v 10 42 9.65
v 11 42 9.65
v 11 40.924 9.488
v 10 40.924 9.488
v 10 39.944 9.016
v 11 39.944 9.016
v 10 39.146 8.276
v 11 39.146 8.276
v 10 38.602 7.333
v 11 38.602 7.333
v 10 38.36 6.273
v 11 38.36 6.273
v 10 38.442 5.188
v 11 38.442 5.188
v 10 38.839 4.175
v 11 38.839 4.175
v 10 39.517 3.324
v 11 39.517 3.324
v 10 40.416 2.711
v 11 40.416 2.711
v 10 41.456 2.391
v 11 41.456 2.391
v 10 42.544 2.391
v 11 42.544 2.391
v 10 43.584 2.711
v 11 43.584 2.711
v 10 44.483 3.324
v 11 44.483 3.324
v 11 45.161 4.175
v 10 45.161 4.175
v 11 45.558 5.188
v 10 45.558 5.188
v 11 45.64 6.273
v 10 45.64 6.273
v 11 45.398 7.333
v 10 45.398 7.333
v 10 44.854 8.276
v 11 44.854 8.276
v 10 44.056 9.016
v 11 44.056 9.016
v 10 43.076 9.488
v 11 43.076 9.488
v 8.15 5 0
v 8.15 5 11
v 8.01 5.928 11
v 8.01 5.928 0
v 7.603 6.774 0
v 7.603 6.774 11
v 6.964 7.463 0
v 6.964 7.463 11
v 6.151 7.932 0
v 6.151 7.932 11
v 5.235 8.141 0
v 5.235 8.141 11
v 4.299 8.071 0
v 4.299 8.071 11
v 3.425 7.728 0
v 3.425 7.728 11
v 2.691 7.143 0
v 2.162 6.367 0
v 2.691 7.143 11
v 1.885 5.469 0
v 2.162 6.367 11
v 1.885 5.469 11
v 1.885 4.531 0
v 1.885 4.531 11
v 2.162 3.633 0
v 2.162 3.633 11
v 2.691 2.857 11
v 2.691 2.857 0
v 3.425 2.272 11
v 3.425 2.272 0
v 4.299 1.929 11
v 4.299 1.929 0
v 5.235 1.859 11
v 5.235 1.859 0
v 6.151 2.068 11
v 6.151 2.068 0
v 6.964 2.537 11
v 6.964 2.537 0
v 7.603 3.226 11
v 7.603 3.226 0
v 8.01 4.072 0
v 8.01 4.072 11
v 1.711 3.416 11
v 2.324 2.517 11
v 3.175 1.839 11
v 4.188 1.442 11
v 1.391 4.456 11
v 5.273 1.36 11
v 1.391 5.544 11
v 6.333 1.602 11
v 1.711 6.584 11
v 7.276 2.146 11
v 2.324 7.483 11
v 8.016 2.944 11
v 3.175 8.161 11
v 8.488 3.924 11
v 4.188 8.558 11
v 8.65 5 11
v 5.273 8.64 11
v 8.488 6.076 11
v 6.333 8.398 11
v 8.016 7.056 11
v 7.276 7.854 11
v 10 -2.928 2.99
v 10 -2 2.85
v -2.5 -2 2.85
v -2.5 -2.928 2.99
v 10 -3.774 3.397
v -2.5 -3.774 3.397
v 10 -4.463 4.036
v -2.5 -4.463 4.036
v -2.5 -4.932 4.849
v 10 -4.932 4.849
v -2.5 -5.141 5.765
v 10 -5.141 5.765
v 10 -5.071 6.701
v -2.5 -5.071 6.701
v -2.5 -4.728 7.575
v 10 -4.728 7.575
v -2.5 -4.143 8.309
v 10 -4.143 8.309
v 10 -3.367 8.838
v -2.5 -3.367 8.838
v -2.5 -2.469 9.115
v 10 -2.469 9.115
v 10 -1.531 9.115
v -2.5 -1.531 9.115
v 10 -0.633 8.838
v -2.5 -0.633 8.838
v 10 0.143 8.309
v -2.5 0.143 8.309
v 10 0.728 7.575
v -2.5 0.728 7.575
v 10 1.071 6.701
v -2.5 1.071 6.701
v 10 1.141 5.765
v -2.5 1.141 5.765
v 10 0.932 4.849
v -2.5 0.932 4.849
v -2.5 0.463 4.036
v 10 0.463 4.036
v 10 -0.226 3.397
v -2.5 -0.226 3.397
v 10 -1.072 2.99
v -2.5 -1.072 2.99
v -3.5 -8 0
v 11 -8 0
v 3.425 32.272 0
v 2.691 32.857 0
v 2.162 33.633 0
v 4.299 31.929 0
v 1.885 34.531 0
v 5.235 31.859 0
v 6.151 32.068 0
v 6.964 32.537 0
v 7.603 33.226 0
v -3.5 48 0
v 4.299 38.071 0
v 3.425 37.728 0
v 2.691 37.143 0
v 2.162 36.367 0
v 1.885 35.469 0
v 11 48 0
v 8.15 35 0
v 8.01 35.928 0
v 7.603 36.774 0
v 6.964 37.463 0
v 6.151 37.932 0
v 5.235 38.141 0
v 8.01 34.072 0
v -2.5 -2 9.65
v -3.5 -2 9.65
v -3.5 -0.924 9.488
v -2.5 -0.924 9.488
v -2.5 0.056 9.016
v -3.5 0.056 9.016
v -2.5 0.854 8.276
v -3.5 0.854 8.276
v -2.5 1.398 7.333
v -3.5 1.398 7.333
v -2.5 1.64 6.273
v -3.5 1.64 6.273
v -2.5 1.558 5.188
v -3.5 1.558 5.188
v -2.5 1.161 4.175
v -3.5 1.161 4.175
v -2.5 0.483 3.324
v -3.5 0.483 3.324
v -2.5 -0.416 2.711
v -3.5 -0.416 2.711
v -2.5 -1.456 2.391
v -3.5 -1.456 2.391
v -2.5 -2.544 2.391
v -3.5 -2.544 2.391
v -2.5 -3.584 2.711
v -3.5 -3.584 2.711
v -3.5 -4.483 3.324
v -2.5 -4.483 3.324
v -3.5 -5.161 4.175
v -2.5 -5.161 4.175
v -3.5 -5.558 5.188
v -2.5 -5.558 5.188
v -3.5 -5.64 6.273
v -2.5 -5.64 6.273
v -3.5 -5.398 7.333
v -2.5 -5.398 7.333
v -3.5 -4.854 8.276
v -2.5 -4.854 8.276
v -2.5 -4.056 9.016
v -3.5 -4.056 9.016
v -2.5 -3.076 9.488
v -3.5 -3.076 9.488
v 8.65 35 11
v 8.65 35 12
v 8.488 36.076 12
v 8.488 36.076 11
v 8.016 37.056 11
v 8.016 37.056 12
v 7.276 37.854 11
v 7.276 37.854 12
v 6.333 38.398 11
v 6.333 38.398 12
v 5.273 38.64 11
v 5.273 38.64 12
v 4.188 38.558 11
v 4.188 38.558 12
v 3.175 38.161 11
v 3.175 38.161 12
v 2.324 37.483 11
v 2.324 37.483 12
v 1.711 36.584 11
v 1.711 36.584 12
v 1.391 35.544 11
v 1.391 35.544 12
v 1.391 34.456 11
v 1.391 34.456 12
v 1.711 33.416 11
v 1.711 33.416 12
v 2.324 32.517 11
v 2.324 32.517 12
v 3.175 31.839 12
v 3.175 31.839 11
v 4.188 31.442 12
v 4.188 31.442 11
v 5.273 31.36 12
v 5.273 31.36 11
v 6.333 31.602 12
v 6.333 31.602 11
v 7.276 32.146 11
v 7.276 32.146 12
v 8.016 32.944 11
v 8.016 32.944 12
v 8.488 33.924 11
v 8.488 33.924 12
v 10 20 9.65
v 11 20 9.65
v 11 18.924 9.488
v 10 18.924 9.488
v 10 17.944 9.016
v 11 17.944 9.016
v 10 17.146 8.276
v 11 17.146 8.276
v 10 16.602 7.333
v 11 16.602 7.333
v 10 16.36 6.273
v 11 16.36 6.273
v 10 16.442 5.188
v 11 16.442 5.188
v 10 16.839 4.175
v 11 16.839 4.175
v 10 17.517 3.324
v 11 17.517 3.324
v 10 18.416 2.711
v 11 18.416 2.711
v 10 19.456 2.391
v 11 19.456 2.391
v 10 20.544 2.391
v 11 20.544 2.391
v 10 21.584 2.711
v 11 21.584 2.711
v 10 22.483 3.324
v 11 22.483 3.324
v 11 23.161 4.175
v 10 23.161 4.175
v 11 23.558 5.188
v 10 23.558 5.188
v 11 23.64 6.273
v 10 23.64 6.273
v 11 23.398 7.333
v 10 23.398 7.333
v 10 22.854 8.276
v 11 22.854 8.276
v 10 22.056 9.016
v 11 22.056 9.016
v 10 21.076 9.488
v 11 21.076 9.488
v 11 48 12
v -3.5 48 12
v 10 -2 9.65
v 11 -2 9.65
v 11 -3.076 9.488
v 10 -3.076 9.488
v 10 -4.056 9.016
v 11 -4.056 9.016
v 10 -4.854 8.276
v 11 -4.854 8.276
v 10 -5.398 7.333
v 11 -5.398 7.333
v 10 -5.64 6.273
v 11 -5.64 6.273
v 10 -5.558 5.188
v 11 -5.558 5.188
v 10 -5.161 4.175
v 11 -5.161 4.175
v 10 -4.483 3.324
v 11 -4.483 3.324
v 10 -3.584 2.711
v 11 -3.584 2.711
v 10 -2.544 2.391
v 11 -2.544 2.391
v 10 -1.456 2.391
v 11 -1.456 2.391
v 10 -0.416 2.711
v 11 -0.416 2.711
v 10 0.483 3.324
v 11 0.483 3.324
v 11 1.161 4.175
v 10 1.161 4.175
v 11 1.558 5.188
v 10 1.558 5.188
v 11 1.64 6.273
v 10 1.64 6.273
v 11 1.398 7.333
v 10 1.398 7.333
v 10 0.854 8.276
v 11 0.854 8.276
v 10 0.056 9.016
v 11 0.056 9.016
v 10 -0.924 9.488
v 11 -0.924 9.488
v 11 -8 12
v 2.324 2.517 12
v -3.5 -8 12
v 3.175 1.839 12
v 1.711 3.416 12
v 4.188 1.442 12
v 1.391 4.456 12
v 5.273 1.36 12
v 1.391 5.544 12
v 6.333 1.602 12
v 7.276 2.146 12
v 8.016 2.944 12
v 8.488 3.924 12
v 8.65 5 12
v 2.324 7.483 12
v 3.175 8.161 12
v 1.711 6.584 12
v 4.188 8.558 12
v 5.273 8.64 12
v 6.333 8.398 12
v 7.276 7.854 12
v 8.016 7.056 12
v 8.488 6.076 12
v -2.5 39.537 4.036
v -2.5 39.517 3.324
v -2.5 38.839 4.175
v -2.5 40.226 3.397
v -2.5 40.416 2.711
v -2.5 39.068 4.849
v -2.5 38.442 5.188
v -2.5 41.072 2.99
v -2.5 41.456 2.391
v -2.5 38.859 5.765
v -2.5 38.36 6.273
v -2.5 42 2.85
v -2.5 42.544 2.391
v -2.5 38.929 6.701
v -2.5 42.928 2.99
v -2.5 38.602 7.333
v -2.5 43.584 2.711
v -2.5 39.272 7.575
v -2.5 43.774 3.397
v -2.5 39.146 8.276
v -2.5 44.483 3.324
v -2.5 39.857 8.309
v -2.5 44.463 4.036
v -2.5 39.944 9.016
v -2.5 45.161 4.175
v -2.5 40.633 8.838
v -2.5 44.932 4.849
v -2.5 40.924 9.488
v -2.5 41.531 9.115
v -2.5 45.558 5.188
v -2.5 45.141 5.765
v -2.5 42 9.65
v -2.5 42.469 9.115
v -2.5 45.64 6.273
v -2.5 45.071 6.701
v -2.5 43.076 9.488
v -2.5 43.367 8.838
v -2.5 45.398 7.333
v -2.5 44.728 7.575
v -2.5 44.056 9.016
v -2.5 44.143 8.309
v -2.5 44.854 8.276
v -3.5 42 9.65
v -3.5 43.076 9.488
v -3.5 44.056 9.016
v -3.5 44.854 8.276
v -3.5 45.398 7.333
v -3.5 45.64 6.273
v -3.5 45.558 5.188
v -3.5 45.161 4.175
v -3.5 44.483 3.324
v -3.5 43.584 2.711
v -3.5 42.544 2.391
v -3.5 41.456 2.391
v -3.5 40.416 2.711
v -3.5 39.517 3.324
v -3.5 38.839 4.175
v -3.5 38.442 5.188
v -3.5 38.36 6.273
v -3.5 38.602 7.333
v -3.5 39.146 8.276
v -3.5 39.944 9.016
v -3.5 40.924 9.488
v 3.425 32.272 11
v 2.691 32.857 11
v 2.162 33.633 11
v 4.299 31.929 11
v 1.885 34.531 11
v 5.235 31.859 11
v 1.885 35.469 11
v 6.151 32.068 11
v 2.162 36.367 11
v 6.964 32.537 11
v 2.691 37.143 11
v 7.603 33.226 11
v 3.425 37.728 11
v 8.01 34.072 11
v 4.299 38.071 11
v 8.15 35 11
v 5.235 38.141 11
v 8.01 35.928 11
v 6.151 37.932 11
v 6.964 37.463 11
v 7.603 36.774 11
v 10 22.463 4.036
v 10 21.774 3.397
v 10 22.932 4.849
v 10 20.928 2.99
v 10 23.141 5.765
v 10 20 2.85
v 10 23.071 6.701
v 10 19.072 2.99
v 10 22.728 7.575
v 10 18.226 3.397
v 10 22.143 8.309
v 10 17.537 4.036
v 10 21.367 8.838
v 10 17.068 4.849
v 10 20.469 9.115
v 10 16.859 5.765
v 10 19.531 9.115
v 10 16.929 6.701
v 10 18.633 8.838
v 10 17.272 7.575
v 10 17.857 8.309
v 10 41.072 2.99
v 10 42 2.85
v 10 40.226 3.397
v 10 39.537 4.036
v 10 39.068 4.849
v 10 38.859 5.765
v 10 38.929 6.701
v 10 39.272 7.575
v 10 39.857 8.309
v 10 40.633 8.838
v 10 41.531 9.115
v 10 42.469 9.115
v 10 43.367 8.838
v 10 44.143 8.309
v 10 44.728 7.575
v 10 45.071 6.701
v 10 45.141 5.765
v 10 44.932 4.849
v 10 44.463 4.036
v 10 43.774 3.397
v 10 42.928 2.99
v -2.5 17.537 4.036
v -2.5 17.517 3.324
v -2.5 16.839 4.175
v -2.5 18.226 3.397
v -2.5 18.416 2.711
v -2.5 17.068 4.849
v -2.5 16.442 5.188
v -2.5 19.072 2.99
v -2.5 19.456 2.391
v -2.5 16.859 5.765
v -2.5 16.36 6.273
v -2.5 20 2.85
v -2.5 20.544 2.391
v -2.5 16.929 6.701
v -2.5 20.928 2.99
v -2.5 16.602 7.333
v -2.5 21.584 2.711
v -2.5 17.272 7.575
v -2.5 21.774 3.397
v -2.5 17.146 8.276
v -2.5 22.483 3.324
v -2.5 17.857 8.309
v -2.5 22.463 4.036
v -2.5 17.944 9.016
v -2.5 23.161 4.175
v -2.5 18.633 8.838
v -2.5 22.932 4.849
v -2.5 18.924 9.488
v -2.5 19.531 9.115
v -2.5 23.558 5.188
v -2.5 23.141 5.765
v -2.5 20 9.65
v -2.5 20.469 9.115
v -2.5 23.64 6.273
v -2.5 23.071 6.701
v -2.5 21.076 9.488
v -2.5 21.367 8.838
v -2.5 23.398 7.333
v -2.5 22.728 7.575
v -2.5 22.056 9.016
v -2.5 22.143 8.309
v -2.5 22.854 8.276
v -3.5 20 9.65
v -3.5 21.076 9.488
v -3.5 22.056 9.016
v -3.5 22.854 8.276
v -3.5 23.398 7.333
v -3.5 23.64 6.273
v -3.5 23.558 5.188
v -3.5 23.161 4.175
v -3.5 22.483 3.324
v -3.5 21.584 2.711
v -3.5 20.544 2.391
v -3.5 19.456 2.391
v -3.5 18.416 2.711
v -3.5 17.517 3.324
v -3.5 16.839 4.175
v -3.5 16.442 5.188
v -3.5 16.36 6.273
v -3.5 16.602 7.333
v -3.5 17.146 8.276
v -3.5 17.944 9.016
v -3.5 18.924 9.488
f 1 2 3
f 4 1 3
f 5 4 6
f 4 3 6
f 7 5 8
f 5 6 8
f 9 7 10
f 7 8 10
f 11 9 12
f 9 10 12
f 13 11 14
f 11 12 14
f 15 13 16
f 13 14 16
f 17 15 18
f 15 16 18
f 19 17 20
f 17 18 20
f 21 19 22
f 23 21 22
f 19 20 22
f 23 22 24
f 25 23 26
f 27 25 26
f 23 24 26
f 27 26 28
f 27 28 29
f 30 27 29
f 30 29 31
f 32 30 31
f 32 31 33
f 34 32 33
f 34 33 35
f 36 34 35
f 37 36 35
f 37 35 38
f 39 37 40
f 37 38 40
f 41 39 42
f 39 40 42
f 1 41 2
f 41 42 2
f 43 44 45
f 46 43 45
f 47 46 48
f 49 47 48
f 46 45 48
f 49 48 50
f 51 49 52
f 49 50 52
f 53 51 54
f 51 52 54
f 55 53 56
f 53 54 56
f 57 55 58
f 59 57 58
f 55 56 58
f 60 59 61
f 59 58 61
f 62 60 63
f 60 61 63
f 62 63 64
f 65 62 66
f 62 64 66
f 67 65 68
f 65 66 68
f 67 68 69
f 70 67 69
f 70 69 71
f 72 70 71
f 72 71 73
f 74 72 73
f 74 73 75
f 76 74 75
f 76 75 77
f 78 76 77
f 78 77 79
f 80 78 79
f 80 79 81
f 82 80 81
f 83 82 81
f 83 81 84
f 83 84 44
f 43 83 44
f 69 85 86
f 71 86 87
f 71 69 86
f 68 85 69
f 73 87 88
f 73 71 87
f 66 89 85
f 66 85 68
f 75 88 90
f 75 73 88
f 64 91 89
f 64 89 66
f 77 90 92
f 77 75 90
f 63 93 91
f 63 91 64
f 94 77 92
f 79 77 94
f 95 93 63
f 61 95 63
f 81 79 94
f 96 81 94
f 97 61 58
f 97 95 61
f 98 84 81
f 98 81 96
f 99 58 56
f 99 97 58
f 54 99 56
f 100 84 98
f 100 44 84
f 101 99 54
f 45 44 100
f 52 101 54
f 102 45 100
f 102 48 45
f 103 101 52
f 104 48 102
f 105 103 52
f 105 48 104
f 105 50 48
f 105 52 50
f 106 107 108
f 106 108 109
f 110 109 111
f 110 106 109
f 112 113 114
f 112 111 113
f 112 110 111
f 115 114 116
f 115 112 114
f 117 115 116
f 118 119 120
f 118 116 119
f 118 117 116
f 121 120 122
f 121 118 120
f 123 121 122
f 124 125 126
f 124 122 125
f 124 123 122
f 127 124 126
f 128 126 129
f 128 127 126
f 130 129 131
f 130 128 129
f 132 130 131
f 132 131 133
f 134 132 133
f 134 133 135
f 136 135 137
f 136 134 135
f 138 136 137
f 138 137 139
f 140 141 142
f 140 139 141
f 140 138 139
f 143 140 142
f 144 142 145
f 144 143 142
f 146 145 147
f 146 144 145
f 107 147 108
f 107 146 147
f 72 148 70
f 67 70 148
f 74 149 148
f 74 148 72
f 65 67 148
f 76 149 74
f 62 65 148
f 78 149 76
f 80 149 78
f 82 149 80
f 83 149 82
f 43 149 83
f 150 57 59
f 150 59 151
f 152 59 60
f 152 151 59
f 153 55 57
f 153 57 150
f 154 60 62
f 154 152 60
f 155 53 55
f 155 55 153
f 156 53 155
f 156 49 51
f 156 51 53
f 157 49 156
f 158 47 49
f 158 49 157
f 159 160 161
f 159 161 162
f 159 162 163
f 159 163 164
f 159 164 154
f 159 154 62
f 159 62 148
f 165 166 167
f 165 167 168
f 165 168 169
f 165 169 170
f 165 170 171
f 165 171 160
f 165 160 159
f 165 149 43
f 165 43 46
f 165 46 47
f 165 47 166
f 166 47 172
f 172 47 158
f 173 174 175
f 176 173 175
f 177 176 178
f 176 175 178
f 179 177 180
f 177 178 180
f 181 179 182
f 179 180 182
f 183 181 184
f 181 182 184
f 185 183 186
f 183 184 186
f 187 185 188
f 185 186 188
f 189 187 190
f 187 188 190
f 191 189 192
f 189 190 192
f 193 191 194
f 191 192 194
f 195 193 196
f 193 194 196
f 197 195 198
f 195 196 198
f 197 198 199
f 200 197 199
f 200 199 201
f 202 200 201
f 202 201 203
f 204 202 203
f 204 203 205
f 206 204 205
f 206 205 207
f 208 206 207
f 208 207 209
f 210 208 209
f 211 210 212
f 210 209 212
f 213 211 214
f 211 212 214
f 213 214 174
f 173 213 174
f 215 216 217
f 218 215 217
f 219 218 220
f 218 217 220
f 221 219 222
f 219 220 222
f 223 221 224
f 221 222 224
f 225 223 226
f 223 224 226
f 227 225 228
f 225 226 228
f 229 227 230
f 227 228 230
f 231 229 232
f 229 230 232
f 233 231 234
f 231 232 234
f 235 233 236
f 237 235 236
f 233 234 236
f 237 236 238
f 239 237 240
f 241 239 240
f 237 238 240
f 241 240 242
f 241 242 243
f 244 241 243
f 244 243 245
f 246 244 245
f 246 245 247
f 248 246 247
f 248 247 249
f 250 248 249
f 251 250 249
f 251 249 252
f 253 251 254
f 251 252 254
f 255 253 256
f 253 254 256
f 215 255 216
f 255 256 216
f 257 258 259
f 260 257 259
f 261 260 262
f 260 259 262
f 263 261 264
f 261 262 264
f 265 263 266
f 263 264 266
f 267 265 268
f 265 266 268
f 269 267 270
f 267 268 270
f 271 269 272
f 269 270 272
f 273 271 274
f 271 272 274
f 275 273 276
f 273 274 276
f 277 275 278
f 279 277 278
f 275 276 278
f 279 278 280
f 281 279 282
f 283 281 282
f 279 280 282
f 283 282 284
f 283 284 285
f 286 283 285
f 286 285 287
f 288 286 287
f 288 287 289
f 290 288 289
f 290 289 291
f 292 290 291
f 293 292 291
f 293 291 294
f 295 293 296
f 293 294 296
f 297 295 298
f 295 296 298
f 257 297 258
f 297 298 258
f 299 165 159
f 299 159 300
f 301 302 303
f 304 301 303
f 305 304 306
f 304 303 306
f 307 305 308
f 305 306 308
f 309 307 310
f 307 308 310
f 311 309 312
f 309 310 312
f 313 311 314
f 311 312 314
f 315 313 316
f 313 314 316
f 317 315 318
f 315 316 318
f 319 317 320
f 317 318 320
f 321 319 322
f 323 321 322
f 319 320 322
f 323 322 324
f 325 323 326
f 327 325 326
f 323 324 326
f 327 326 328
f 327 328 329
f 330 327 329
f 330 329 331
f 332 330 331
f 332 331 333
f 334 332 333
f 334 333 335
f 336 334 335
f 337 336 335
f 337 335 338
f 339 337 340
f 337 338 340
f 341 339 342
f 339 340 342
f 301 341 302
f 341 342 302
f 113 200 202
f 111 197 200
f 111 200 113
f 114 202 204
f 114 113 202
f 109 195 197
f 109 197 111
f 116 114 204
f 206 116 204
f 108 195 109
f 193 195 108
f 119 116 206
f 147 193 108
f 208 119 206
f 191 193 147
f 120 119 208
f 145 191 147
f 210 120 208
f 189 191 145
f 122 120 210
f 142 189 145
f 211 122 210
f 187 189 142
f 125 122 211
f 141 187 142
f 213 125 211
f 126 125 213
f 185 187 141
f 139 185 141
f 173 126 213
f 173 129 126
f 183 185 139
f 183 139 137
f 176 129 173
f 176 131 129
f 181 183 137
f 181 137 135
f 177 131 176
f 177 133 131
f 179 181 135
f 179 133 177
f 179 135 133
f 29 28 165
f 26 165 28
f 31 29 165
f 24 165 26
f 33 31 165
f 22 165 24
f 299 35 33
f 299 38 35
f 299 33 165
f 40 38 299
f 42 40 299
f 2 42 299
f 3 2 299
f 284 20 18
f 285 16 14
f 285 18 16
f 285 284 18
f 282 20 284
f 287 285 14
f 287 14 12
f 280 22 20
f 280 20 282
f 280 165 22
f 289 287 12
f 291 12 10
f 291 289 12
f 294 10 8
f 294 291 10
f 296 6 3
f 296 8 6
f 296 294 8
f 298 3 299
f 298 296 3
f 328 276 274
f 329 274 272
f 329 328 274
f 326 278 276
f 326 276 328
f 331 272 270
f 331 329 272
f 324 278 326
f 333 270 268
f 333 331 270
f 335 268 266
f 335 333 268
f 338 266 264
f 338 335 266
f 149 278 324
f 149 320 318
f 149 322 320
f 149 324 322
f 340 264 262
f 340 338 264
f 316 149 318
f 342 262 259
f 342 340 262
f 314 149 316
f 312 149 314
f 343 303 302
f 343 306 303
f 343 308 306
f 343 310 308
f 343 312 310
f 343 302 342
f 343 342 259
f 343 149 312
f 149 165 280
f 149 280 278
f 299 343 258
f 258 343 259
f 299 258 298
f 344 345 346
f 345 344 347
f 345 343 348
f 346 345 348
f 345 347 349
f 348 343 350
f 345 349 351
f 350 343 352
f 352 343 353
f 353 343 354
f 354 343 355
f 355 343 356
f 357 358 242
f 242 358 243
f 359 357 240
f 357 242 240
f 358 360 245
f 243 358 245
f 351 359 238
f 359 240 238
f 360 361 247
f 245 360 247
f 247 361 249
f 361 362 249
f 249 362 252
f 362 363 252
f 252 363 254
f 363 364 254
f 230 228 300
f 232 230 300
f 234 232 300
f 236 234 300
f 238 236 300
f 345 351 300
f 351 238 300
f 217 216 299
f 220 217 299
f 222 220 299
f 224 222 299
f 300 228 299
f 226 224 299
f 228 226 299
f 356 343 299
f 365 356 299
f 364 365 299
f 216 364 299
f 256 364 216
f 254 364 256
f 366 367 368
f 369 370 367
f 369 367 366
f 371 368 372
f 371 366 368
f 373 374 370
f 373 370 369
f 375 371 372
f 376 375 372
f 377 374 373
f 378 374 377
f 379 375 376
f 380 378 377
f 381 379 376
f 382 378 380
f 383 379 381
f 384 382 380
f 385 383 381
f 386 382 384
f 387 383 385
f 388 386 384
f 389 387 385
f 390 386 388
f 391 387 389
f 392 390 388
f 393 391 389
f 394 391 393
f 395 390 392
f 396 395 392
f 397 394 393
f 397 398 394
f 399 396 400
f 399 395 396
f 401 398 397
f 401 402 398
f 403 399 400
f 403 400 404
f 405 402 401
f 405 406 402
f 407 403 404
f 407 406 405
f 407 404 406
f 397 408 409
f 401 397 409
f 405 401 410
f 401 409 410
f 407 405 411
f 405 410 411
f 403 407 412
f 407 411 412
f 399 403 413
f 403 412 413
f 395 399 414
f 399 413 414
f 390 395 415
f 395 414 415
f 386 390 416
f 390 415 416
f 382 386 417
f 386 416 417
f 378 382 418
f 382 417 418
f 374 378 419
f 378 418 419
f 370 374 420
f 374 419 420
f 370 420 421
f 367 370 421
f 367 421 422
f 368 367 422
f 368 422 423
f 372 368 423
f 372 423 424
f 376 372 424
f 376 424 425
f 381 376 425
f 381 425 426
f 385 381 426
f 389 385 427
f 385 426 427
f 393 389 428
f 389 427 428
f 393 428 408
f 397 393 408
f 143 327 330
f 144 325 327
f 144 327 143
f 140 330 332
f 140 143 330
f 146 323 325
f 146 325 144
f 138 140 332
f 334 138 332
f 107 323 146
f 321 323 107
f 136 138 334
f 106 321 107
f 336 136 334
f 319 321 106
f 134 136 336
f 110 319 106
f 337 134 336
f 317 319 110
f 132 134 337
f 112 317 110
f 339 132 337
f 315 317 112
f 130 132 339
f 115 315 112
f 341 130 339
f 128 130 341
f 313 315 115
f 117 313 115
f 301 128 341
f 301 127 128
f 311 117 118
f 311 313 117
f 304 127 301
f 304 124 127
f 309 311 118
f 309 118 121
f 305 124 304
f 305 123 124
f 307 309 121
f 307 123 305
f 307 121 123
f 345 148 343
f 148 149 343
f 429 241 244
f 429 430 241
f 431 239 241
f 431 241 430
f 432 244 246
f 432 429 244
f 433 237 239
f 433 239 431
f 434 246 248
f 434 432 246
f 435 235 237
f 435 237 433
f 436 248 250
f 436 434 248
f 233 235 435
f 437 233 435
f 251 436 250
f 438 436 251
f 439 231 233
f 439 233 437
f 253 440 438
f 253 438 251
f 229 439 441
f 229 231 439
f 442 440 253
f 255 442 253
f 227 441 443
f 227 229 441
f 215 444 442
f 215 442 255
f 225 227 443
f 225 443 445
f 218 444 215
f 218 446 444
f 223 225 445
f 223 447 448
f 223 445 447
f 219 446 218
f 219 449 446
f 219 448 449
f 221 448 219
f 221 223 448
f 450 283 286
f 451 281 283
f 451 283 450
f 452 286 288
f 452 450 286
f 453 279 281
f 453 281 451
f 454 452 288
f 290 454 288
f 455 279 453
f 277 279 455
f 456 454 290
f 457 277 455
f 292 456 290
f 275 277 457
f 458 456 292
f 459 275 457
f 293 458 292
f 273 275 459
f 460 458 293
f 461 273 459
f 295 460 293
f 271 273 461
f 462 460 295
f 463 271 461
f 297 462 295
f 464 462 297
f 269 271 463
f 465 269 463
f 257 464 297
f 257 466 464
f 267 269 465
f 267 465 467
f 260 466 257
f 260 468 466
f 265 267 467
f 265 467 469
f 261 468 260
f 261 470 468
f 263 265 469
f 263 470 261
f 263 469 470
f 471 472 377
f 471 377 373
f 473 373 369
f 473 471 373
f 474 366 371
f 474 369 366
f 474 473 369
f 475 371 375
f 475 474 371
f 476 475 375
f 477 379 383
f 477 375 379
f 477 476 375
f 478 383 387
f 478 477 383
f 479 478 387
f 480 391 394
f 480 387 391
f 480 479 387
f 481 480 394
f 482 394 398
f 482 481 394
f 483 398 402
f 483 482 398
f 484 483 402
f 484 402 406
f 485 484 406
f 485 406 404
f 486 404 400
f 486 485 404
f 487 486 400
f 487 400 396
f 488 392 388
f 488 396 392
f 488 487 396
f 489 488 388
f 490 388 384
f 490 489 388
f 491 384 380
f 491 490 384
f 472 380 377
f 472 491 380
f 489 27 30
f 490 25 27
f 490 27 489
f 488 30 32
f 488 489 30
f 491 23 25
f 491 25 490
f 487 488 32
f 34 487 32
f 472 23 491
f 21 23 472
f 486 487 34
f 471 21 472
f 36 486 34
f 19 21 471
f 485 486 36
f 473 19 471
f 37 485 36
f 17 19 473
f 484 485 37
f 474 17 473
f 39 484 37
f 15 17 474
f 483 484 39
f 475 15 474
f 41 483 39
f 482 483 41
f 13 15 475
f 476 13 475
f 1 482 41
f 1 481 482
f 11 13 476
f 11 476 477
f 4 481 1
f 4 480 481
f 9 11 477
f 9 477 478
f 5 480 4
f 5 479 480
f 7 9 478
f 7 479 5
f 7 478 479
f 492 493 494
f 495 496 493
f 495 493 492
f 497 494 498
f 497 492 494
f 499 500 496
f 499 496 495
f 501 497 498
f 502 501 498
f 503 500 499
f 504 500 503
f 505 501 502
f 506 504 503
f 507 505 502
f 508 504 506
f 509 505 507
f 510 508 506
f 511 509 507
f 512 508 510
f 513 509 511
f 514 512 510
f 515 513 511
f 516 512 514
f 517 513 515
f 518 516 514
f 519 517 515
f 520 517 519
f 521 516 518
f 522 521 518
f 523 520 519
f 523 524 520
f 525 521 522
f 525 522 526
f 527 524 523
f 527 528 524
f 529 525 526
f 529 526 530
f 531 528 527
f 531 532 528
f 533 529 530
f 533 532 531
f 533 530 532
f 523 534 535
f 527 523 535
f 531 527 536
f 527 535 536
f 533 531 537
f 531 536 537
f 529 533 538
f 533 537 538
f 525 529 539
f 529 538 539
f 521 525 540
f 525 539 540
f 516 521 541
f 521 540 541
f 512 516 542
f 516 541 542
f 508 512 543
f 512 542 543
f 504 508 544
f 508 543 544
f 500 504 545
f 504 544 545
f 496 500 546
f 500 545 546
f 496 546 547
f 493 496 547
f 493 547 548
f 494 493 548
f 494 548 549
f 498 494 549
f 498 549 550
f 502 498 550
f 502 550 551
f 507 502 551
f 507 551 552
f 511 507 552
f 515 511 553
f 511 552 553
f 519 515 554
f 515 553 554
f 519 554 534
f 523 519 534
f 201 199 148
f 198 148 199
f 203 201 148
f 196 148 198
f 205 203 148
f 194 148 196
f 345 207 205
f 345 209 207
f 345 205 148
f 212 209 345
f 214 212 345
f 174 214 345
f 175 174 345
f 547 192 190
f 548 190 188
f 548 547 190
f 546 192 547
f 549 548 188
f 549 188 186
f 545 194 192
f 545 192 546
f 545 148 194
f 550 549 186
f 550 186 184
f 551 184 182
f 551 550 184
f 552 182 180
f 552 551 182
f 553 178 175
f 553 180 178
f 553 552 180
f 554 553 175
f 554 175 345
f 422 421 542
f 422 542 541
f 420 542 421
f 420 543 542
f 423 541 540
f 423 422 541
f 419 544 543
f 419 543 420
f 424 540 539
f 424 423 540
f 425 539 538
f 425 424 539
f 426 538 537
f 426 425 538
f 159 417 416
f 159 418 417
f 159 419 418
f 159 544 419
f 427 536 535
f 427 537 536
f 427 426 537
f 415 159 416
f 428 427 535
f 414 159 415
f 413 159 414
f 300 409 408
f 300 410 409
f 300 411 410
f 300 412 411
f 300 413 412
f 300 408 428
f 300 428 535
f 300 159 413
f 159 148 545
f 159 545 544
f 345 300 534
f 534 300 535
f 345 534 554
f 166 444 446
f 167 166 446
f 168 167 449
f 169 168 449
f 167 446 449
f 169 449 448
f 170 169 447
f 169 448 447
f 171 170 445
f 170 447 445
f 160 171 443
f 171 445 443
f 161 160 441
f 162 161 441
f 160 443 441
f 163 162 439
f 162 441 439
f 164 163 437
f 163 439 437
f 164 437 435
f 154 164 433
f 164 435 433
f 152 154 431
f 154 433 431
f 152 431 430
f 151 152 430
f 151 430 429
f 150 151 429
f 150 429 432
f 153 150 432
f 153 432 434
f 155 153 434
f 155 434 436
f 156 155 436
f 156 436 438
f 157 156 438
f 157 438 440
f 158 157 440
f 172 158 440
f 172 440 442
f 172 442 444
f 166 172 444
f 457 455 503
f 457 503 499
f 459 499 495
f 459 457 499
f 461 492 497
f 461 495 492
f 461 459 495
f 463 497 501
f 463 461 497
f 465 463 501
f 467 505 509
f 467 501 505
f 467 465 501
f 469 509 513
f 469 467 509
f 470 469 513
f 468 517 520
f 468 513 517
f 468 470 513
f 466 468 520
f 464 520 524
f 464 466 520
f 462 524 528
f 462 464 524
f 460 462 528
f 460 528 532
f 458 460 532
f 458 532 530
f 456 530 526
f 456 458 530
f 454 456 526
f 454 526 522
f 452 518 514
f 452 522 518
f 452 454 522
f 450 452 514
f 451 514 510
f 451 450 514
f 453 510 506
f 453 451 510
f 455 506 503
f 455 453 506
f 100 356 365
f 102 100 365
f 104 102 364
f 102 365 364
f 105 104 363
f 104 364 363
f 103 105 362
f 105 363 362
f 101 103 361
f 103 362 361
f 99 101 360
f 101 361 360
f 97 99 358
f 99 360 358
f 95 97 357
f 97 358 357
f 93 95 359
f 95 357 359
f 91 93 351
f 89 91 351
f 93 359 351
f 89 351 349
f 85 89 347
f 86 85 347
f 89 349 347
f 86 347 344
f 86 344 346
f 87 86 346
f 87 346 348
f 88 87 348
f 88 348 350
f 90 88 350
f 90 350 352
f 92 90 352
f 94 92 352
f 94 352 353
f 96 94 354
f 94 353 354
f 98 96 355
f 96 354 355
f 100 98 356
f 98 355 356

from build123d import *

# Parameters (mm, degrees)
ESQUISSE1_W                  = 12
ESQUISSE1_H                  = 40
BOSS_EXTRU_1_DEPTH           = 12
ESQUISSE3_R                  = 3.15
ENL_V_MAT_EXTRU_1_DEPTH      = 44.451121965
ENL_V_MAT_EXTRU_1_DEPTH_BACK = 44.451121965
ESQUISSE4_R                  = 3.15
ENL_V_MAT_EXTRU_2_DEPTH      = 44.451121965
ENL_V_MAT_EXTRU_2_DEPTH_BACK = 44.451121965
ESQUISSE5_R                  = 3.65
ENL_V_MAT_EXTRU_3_DEPTH      = 1
ESQUISSE6_R                  = 3.65
ENL_V_MAT_EXTRU_4_DEPTH      = 1
ESQUISSE7_W                  = 12
ESQUISSE7_H                  = 8
BOSS_EXTRU_2_DEPTH           = 12
ESQUISSE8_W                  = 1
ESQUISSE8_H                  = 12
ENL_V_MAT_EXTRU_5_DEPTH      = 59.514955353
ENL_V_MAT_EXTRU_5_DEPTH_BACK = 59.514955353
ESQUISSE9_R                  = 3.15
ENL_V_MAT_EXTRU_6_DEPTH      = 51.68530359
ENL_V_MAT_EXTRU_6_DEPTH_BACK = 51.68530359
ESQUISSE11_W                 = 12
ESQUISSE11_H                 = 56
ESQUISSE11_R                 = 3.15
BOSS_EXTRU_3_DEPTH           = 3.5
ESQUISSE12_R                 = 3.65
ENL_V_MAT_EXTRU_8_DEPTH      = 1
ESQUISSE13_R                 = 3.65
ENL_V_MAT_EXTRU_9_DEPTH      = 1


with BuildPart() as part:
    # Esquisse1 → Boss.-Extru.1 (new body)
    with BuildSketch(Plane.XY):
        with Locations((6, 20)):
            Rectangle(ESQUISSE1_W, ESQUISSE1_H)
    extrude(amount=BOSS_EXTRU_1_DEPTH)

    # Esquisse3 → Enlèv. mat.-Extru.1 (cut, two sides)
    with BuildSketch(Plane.XY.offset(12)) as enl_v_mat_extru_1_sk:
        with Locations((5, 5)):
            Circle(ESQUISSE3_R)
        with Locations((5, 35)):
            Circle(ESQUISSE3_R)
    extrude(amount=ENL_V_MAT_EXTRU_1_DEPTH, mode=Mode.SUBTRACT)
    extrude(enl_v_mat_extru_1_sk.sketch, amount=-ENL_V_MAT_EXTRU_1_DEPTH_BACK, mode=Mode.SUBTRACT)

    # Esquisse4 → Enlèv. mat.-Extru.2 (cut, two sides)
    with BuildSketch(Plane(origin=(12, 0, 0), x_dir=(0, 0, -1), z_dir=(1, 0, 0))) as enl_v_mat_extru_2_sk:
        with Locations((-6, 20)):
            Circle(ESQUISSE4_R)
    extrude(amount=ENL_V_MAT_EXTRU_2_DEPTH, mode=Mode.SUBTRACT)
    extrude(enl_v_mat_extru_2_sk.sketch, amount=-ENL_V_MAT_EXTRU_2_DEPTH_BACK, mode=Mode.SUBTRACT)

    # Esquisse5 → Enlèv. mat.-Extru.3 (cut)
    with BuildSketch(Plane.XY.offset(12)):
        with Locations((5, 35)):
            Circle(ESQUISSE5_R)
        with Locations((5, 5)):
            Circle(ESQUISSE5_R)
    extrude(amount=-ENL_V_MAT_EXTRU_3_DEPTH, mode=Mode.SUBTRACT)

    # Esquisse6 → Enlèv. mat.-Extru.4 (cut)
    with BuildSketch(Plane(origin=(12, 0, 0), x_dir=(0, 0, -1), z_dir=(1, 0, 0))):
        with Locations((-6, 20)):
            Circle(ESQUISSE6_R)
    extrude(amount=-ENL_V_MAT_EXTRU_4_DEPTH, mode=Mode.SUBTRACT)

    # Esquisse7 → Boss.-Extru.2 (add)
    with BuildSketch(Plane(origin=(12, 0, 0), x_dir=(0, 0, -1), z_dir=(1, 0, 0))):
        with Locations((-6, -4)):
            Rectangle(ESQUISSE7_W, ESQUISSE7_H)
        with Locations((-6, 44)):
            Rectangle(ESQUISSE7_W, ESQUISSE7_H)
    extrude(amount=-BOSS_EXTRU_2_DEPTH)

    # Esquisse8 → Enlèv. mat.-Extru.5 (cut, two sides)
    with BuildSketch(Plane.XZ.offset(8)) as enl_v_mat_extru_5_sk:
        with Locations((11.5, 6)):
            Rectangle(ESQUISSE8_W, ESQUISSE8_H)
    extrude(amount=ENL_V_MAT_EXTRU_5_DEPTH, mode=Mode.SUBTRACT)
    extrude(enl_v_mat_extru_5_sk.sketch, amount=-ENL_V_MAT_EXTRU_5_DEPTH_BACK, mode=Mode.SUBTRACT)

    # Esquisse9 → Enlèv. mat.-Extru.6 (cut, two sides)
    with BuildSketch(Plane(origin=(11, 0, 0), x_dir=(0, 0, -1), z_dir=(1, 0, 0))) as enl_v_mat_extru_6_sk:
        with Locations((-6, 42)):
            Circle(ESQUISSE9_R)
        with Locations((-6, -2)):
            Circle(ESQUISSE9_R)
    extrude(amount=ENL_V_MAT_EXTRU_6_DEPTH, mode=Mode.SUBTRACT)
    extrude(enl_v_mat_extru_6_sk.sketch, amount=-ENL_V_MAT_EXTRU_6_DEPTH_BACK, mode=Mode.SUBTRACT)

    # Esquisse11 → Boss.-Extru.3 (add)
    with BuildSketch(Plane.ZY):
        with Locations((6, 20)):
            Rectangle(ESQUISSE11_W, ESQUISSE11_H)
        with Locations(Location((6, -2, 0), (0, 0, 180))):
            Circle(ESQUISSE11_R, mode=Mode.SUBTRACT)
        with Locations(Location((6, 20, 0), (0, 0, 180))):
            Circle(ESQUISSE11_R, mode=Mode.SUBTRACT)
        with Locations(Location((6, 42, 0), (0, 0, 180))):
            Circle(ESQUISSE11_R, mode=Mode.SUBTRACT)
    extrude(amount=BOSS_EXTRU_3_DEPTH)

    # Esquisse12 → Enlèv. mat.-Extru.8 (cut)
    with BuildSketch(Plane.ZY.offset(3.5)):
        with Locations((6, 42)):
            Circle(ESQUISSE12_R)
        with Locations((6, 20)):
            Circle(ESQUISSE12_R)
        with Locations((6, -2)):
            Circle(ESQUISSE12_R)
    extrude(amount=-ENL_V_MAT_EXTRU_8_DEPTH, mode=Mode.SUBTRACT)

    # Esquisse13 → Enlèv. mat.-Extru.9 (cut)
    with BuildSketch(Plane(origin=(11, 0, 0), x_dir=(0, 0, -1), z_dir=(1, 0, 0))):
        with Locations(Location((-6, -2, 0), (0, 0, 180))):
            Circle(ESQUISSE13_R)
        with Locations(Location((-6, 20, 0), (0, 0, 180))):
            Circle(ESQUISSE13_R)
        with Locations(Location((-6, 42, 0), (0, 0, 180))):
            Circle(ESQUISSE13_R)
    extrude(amount=-ENL_V_MAT_EXTRU_9_DEPTH, mode=Mode.SUBTRACT)


solid = part.part
